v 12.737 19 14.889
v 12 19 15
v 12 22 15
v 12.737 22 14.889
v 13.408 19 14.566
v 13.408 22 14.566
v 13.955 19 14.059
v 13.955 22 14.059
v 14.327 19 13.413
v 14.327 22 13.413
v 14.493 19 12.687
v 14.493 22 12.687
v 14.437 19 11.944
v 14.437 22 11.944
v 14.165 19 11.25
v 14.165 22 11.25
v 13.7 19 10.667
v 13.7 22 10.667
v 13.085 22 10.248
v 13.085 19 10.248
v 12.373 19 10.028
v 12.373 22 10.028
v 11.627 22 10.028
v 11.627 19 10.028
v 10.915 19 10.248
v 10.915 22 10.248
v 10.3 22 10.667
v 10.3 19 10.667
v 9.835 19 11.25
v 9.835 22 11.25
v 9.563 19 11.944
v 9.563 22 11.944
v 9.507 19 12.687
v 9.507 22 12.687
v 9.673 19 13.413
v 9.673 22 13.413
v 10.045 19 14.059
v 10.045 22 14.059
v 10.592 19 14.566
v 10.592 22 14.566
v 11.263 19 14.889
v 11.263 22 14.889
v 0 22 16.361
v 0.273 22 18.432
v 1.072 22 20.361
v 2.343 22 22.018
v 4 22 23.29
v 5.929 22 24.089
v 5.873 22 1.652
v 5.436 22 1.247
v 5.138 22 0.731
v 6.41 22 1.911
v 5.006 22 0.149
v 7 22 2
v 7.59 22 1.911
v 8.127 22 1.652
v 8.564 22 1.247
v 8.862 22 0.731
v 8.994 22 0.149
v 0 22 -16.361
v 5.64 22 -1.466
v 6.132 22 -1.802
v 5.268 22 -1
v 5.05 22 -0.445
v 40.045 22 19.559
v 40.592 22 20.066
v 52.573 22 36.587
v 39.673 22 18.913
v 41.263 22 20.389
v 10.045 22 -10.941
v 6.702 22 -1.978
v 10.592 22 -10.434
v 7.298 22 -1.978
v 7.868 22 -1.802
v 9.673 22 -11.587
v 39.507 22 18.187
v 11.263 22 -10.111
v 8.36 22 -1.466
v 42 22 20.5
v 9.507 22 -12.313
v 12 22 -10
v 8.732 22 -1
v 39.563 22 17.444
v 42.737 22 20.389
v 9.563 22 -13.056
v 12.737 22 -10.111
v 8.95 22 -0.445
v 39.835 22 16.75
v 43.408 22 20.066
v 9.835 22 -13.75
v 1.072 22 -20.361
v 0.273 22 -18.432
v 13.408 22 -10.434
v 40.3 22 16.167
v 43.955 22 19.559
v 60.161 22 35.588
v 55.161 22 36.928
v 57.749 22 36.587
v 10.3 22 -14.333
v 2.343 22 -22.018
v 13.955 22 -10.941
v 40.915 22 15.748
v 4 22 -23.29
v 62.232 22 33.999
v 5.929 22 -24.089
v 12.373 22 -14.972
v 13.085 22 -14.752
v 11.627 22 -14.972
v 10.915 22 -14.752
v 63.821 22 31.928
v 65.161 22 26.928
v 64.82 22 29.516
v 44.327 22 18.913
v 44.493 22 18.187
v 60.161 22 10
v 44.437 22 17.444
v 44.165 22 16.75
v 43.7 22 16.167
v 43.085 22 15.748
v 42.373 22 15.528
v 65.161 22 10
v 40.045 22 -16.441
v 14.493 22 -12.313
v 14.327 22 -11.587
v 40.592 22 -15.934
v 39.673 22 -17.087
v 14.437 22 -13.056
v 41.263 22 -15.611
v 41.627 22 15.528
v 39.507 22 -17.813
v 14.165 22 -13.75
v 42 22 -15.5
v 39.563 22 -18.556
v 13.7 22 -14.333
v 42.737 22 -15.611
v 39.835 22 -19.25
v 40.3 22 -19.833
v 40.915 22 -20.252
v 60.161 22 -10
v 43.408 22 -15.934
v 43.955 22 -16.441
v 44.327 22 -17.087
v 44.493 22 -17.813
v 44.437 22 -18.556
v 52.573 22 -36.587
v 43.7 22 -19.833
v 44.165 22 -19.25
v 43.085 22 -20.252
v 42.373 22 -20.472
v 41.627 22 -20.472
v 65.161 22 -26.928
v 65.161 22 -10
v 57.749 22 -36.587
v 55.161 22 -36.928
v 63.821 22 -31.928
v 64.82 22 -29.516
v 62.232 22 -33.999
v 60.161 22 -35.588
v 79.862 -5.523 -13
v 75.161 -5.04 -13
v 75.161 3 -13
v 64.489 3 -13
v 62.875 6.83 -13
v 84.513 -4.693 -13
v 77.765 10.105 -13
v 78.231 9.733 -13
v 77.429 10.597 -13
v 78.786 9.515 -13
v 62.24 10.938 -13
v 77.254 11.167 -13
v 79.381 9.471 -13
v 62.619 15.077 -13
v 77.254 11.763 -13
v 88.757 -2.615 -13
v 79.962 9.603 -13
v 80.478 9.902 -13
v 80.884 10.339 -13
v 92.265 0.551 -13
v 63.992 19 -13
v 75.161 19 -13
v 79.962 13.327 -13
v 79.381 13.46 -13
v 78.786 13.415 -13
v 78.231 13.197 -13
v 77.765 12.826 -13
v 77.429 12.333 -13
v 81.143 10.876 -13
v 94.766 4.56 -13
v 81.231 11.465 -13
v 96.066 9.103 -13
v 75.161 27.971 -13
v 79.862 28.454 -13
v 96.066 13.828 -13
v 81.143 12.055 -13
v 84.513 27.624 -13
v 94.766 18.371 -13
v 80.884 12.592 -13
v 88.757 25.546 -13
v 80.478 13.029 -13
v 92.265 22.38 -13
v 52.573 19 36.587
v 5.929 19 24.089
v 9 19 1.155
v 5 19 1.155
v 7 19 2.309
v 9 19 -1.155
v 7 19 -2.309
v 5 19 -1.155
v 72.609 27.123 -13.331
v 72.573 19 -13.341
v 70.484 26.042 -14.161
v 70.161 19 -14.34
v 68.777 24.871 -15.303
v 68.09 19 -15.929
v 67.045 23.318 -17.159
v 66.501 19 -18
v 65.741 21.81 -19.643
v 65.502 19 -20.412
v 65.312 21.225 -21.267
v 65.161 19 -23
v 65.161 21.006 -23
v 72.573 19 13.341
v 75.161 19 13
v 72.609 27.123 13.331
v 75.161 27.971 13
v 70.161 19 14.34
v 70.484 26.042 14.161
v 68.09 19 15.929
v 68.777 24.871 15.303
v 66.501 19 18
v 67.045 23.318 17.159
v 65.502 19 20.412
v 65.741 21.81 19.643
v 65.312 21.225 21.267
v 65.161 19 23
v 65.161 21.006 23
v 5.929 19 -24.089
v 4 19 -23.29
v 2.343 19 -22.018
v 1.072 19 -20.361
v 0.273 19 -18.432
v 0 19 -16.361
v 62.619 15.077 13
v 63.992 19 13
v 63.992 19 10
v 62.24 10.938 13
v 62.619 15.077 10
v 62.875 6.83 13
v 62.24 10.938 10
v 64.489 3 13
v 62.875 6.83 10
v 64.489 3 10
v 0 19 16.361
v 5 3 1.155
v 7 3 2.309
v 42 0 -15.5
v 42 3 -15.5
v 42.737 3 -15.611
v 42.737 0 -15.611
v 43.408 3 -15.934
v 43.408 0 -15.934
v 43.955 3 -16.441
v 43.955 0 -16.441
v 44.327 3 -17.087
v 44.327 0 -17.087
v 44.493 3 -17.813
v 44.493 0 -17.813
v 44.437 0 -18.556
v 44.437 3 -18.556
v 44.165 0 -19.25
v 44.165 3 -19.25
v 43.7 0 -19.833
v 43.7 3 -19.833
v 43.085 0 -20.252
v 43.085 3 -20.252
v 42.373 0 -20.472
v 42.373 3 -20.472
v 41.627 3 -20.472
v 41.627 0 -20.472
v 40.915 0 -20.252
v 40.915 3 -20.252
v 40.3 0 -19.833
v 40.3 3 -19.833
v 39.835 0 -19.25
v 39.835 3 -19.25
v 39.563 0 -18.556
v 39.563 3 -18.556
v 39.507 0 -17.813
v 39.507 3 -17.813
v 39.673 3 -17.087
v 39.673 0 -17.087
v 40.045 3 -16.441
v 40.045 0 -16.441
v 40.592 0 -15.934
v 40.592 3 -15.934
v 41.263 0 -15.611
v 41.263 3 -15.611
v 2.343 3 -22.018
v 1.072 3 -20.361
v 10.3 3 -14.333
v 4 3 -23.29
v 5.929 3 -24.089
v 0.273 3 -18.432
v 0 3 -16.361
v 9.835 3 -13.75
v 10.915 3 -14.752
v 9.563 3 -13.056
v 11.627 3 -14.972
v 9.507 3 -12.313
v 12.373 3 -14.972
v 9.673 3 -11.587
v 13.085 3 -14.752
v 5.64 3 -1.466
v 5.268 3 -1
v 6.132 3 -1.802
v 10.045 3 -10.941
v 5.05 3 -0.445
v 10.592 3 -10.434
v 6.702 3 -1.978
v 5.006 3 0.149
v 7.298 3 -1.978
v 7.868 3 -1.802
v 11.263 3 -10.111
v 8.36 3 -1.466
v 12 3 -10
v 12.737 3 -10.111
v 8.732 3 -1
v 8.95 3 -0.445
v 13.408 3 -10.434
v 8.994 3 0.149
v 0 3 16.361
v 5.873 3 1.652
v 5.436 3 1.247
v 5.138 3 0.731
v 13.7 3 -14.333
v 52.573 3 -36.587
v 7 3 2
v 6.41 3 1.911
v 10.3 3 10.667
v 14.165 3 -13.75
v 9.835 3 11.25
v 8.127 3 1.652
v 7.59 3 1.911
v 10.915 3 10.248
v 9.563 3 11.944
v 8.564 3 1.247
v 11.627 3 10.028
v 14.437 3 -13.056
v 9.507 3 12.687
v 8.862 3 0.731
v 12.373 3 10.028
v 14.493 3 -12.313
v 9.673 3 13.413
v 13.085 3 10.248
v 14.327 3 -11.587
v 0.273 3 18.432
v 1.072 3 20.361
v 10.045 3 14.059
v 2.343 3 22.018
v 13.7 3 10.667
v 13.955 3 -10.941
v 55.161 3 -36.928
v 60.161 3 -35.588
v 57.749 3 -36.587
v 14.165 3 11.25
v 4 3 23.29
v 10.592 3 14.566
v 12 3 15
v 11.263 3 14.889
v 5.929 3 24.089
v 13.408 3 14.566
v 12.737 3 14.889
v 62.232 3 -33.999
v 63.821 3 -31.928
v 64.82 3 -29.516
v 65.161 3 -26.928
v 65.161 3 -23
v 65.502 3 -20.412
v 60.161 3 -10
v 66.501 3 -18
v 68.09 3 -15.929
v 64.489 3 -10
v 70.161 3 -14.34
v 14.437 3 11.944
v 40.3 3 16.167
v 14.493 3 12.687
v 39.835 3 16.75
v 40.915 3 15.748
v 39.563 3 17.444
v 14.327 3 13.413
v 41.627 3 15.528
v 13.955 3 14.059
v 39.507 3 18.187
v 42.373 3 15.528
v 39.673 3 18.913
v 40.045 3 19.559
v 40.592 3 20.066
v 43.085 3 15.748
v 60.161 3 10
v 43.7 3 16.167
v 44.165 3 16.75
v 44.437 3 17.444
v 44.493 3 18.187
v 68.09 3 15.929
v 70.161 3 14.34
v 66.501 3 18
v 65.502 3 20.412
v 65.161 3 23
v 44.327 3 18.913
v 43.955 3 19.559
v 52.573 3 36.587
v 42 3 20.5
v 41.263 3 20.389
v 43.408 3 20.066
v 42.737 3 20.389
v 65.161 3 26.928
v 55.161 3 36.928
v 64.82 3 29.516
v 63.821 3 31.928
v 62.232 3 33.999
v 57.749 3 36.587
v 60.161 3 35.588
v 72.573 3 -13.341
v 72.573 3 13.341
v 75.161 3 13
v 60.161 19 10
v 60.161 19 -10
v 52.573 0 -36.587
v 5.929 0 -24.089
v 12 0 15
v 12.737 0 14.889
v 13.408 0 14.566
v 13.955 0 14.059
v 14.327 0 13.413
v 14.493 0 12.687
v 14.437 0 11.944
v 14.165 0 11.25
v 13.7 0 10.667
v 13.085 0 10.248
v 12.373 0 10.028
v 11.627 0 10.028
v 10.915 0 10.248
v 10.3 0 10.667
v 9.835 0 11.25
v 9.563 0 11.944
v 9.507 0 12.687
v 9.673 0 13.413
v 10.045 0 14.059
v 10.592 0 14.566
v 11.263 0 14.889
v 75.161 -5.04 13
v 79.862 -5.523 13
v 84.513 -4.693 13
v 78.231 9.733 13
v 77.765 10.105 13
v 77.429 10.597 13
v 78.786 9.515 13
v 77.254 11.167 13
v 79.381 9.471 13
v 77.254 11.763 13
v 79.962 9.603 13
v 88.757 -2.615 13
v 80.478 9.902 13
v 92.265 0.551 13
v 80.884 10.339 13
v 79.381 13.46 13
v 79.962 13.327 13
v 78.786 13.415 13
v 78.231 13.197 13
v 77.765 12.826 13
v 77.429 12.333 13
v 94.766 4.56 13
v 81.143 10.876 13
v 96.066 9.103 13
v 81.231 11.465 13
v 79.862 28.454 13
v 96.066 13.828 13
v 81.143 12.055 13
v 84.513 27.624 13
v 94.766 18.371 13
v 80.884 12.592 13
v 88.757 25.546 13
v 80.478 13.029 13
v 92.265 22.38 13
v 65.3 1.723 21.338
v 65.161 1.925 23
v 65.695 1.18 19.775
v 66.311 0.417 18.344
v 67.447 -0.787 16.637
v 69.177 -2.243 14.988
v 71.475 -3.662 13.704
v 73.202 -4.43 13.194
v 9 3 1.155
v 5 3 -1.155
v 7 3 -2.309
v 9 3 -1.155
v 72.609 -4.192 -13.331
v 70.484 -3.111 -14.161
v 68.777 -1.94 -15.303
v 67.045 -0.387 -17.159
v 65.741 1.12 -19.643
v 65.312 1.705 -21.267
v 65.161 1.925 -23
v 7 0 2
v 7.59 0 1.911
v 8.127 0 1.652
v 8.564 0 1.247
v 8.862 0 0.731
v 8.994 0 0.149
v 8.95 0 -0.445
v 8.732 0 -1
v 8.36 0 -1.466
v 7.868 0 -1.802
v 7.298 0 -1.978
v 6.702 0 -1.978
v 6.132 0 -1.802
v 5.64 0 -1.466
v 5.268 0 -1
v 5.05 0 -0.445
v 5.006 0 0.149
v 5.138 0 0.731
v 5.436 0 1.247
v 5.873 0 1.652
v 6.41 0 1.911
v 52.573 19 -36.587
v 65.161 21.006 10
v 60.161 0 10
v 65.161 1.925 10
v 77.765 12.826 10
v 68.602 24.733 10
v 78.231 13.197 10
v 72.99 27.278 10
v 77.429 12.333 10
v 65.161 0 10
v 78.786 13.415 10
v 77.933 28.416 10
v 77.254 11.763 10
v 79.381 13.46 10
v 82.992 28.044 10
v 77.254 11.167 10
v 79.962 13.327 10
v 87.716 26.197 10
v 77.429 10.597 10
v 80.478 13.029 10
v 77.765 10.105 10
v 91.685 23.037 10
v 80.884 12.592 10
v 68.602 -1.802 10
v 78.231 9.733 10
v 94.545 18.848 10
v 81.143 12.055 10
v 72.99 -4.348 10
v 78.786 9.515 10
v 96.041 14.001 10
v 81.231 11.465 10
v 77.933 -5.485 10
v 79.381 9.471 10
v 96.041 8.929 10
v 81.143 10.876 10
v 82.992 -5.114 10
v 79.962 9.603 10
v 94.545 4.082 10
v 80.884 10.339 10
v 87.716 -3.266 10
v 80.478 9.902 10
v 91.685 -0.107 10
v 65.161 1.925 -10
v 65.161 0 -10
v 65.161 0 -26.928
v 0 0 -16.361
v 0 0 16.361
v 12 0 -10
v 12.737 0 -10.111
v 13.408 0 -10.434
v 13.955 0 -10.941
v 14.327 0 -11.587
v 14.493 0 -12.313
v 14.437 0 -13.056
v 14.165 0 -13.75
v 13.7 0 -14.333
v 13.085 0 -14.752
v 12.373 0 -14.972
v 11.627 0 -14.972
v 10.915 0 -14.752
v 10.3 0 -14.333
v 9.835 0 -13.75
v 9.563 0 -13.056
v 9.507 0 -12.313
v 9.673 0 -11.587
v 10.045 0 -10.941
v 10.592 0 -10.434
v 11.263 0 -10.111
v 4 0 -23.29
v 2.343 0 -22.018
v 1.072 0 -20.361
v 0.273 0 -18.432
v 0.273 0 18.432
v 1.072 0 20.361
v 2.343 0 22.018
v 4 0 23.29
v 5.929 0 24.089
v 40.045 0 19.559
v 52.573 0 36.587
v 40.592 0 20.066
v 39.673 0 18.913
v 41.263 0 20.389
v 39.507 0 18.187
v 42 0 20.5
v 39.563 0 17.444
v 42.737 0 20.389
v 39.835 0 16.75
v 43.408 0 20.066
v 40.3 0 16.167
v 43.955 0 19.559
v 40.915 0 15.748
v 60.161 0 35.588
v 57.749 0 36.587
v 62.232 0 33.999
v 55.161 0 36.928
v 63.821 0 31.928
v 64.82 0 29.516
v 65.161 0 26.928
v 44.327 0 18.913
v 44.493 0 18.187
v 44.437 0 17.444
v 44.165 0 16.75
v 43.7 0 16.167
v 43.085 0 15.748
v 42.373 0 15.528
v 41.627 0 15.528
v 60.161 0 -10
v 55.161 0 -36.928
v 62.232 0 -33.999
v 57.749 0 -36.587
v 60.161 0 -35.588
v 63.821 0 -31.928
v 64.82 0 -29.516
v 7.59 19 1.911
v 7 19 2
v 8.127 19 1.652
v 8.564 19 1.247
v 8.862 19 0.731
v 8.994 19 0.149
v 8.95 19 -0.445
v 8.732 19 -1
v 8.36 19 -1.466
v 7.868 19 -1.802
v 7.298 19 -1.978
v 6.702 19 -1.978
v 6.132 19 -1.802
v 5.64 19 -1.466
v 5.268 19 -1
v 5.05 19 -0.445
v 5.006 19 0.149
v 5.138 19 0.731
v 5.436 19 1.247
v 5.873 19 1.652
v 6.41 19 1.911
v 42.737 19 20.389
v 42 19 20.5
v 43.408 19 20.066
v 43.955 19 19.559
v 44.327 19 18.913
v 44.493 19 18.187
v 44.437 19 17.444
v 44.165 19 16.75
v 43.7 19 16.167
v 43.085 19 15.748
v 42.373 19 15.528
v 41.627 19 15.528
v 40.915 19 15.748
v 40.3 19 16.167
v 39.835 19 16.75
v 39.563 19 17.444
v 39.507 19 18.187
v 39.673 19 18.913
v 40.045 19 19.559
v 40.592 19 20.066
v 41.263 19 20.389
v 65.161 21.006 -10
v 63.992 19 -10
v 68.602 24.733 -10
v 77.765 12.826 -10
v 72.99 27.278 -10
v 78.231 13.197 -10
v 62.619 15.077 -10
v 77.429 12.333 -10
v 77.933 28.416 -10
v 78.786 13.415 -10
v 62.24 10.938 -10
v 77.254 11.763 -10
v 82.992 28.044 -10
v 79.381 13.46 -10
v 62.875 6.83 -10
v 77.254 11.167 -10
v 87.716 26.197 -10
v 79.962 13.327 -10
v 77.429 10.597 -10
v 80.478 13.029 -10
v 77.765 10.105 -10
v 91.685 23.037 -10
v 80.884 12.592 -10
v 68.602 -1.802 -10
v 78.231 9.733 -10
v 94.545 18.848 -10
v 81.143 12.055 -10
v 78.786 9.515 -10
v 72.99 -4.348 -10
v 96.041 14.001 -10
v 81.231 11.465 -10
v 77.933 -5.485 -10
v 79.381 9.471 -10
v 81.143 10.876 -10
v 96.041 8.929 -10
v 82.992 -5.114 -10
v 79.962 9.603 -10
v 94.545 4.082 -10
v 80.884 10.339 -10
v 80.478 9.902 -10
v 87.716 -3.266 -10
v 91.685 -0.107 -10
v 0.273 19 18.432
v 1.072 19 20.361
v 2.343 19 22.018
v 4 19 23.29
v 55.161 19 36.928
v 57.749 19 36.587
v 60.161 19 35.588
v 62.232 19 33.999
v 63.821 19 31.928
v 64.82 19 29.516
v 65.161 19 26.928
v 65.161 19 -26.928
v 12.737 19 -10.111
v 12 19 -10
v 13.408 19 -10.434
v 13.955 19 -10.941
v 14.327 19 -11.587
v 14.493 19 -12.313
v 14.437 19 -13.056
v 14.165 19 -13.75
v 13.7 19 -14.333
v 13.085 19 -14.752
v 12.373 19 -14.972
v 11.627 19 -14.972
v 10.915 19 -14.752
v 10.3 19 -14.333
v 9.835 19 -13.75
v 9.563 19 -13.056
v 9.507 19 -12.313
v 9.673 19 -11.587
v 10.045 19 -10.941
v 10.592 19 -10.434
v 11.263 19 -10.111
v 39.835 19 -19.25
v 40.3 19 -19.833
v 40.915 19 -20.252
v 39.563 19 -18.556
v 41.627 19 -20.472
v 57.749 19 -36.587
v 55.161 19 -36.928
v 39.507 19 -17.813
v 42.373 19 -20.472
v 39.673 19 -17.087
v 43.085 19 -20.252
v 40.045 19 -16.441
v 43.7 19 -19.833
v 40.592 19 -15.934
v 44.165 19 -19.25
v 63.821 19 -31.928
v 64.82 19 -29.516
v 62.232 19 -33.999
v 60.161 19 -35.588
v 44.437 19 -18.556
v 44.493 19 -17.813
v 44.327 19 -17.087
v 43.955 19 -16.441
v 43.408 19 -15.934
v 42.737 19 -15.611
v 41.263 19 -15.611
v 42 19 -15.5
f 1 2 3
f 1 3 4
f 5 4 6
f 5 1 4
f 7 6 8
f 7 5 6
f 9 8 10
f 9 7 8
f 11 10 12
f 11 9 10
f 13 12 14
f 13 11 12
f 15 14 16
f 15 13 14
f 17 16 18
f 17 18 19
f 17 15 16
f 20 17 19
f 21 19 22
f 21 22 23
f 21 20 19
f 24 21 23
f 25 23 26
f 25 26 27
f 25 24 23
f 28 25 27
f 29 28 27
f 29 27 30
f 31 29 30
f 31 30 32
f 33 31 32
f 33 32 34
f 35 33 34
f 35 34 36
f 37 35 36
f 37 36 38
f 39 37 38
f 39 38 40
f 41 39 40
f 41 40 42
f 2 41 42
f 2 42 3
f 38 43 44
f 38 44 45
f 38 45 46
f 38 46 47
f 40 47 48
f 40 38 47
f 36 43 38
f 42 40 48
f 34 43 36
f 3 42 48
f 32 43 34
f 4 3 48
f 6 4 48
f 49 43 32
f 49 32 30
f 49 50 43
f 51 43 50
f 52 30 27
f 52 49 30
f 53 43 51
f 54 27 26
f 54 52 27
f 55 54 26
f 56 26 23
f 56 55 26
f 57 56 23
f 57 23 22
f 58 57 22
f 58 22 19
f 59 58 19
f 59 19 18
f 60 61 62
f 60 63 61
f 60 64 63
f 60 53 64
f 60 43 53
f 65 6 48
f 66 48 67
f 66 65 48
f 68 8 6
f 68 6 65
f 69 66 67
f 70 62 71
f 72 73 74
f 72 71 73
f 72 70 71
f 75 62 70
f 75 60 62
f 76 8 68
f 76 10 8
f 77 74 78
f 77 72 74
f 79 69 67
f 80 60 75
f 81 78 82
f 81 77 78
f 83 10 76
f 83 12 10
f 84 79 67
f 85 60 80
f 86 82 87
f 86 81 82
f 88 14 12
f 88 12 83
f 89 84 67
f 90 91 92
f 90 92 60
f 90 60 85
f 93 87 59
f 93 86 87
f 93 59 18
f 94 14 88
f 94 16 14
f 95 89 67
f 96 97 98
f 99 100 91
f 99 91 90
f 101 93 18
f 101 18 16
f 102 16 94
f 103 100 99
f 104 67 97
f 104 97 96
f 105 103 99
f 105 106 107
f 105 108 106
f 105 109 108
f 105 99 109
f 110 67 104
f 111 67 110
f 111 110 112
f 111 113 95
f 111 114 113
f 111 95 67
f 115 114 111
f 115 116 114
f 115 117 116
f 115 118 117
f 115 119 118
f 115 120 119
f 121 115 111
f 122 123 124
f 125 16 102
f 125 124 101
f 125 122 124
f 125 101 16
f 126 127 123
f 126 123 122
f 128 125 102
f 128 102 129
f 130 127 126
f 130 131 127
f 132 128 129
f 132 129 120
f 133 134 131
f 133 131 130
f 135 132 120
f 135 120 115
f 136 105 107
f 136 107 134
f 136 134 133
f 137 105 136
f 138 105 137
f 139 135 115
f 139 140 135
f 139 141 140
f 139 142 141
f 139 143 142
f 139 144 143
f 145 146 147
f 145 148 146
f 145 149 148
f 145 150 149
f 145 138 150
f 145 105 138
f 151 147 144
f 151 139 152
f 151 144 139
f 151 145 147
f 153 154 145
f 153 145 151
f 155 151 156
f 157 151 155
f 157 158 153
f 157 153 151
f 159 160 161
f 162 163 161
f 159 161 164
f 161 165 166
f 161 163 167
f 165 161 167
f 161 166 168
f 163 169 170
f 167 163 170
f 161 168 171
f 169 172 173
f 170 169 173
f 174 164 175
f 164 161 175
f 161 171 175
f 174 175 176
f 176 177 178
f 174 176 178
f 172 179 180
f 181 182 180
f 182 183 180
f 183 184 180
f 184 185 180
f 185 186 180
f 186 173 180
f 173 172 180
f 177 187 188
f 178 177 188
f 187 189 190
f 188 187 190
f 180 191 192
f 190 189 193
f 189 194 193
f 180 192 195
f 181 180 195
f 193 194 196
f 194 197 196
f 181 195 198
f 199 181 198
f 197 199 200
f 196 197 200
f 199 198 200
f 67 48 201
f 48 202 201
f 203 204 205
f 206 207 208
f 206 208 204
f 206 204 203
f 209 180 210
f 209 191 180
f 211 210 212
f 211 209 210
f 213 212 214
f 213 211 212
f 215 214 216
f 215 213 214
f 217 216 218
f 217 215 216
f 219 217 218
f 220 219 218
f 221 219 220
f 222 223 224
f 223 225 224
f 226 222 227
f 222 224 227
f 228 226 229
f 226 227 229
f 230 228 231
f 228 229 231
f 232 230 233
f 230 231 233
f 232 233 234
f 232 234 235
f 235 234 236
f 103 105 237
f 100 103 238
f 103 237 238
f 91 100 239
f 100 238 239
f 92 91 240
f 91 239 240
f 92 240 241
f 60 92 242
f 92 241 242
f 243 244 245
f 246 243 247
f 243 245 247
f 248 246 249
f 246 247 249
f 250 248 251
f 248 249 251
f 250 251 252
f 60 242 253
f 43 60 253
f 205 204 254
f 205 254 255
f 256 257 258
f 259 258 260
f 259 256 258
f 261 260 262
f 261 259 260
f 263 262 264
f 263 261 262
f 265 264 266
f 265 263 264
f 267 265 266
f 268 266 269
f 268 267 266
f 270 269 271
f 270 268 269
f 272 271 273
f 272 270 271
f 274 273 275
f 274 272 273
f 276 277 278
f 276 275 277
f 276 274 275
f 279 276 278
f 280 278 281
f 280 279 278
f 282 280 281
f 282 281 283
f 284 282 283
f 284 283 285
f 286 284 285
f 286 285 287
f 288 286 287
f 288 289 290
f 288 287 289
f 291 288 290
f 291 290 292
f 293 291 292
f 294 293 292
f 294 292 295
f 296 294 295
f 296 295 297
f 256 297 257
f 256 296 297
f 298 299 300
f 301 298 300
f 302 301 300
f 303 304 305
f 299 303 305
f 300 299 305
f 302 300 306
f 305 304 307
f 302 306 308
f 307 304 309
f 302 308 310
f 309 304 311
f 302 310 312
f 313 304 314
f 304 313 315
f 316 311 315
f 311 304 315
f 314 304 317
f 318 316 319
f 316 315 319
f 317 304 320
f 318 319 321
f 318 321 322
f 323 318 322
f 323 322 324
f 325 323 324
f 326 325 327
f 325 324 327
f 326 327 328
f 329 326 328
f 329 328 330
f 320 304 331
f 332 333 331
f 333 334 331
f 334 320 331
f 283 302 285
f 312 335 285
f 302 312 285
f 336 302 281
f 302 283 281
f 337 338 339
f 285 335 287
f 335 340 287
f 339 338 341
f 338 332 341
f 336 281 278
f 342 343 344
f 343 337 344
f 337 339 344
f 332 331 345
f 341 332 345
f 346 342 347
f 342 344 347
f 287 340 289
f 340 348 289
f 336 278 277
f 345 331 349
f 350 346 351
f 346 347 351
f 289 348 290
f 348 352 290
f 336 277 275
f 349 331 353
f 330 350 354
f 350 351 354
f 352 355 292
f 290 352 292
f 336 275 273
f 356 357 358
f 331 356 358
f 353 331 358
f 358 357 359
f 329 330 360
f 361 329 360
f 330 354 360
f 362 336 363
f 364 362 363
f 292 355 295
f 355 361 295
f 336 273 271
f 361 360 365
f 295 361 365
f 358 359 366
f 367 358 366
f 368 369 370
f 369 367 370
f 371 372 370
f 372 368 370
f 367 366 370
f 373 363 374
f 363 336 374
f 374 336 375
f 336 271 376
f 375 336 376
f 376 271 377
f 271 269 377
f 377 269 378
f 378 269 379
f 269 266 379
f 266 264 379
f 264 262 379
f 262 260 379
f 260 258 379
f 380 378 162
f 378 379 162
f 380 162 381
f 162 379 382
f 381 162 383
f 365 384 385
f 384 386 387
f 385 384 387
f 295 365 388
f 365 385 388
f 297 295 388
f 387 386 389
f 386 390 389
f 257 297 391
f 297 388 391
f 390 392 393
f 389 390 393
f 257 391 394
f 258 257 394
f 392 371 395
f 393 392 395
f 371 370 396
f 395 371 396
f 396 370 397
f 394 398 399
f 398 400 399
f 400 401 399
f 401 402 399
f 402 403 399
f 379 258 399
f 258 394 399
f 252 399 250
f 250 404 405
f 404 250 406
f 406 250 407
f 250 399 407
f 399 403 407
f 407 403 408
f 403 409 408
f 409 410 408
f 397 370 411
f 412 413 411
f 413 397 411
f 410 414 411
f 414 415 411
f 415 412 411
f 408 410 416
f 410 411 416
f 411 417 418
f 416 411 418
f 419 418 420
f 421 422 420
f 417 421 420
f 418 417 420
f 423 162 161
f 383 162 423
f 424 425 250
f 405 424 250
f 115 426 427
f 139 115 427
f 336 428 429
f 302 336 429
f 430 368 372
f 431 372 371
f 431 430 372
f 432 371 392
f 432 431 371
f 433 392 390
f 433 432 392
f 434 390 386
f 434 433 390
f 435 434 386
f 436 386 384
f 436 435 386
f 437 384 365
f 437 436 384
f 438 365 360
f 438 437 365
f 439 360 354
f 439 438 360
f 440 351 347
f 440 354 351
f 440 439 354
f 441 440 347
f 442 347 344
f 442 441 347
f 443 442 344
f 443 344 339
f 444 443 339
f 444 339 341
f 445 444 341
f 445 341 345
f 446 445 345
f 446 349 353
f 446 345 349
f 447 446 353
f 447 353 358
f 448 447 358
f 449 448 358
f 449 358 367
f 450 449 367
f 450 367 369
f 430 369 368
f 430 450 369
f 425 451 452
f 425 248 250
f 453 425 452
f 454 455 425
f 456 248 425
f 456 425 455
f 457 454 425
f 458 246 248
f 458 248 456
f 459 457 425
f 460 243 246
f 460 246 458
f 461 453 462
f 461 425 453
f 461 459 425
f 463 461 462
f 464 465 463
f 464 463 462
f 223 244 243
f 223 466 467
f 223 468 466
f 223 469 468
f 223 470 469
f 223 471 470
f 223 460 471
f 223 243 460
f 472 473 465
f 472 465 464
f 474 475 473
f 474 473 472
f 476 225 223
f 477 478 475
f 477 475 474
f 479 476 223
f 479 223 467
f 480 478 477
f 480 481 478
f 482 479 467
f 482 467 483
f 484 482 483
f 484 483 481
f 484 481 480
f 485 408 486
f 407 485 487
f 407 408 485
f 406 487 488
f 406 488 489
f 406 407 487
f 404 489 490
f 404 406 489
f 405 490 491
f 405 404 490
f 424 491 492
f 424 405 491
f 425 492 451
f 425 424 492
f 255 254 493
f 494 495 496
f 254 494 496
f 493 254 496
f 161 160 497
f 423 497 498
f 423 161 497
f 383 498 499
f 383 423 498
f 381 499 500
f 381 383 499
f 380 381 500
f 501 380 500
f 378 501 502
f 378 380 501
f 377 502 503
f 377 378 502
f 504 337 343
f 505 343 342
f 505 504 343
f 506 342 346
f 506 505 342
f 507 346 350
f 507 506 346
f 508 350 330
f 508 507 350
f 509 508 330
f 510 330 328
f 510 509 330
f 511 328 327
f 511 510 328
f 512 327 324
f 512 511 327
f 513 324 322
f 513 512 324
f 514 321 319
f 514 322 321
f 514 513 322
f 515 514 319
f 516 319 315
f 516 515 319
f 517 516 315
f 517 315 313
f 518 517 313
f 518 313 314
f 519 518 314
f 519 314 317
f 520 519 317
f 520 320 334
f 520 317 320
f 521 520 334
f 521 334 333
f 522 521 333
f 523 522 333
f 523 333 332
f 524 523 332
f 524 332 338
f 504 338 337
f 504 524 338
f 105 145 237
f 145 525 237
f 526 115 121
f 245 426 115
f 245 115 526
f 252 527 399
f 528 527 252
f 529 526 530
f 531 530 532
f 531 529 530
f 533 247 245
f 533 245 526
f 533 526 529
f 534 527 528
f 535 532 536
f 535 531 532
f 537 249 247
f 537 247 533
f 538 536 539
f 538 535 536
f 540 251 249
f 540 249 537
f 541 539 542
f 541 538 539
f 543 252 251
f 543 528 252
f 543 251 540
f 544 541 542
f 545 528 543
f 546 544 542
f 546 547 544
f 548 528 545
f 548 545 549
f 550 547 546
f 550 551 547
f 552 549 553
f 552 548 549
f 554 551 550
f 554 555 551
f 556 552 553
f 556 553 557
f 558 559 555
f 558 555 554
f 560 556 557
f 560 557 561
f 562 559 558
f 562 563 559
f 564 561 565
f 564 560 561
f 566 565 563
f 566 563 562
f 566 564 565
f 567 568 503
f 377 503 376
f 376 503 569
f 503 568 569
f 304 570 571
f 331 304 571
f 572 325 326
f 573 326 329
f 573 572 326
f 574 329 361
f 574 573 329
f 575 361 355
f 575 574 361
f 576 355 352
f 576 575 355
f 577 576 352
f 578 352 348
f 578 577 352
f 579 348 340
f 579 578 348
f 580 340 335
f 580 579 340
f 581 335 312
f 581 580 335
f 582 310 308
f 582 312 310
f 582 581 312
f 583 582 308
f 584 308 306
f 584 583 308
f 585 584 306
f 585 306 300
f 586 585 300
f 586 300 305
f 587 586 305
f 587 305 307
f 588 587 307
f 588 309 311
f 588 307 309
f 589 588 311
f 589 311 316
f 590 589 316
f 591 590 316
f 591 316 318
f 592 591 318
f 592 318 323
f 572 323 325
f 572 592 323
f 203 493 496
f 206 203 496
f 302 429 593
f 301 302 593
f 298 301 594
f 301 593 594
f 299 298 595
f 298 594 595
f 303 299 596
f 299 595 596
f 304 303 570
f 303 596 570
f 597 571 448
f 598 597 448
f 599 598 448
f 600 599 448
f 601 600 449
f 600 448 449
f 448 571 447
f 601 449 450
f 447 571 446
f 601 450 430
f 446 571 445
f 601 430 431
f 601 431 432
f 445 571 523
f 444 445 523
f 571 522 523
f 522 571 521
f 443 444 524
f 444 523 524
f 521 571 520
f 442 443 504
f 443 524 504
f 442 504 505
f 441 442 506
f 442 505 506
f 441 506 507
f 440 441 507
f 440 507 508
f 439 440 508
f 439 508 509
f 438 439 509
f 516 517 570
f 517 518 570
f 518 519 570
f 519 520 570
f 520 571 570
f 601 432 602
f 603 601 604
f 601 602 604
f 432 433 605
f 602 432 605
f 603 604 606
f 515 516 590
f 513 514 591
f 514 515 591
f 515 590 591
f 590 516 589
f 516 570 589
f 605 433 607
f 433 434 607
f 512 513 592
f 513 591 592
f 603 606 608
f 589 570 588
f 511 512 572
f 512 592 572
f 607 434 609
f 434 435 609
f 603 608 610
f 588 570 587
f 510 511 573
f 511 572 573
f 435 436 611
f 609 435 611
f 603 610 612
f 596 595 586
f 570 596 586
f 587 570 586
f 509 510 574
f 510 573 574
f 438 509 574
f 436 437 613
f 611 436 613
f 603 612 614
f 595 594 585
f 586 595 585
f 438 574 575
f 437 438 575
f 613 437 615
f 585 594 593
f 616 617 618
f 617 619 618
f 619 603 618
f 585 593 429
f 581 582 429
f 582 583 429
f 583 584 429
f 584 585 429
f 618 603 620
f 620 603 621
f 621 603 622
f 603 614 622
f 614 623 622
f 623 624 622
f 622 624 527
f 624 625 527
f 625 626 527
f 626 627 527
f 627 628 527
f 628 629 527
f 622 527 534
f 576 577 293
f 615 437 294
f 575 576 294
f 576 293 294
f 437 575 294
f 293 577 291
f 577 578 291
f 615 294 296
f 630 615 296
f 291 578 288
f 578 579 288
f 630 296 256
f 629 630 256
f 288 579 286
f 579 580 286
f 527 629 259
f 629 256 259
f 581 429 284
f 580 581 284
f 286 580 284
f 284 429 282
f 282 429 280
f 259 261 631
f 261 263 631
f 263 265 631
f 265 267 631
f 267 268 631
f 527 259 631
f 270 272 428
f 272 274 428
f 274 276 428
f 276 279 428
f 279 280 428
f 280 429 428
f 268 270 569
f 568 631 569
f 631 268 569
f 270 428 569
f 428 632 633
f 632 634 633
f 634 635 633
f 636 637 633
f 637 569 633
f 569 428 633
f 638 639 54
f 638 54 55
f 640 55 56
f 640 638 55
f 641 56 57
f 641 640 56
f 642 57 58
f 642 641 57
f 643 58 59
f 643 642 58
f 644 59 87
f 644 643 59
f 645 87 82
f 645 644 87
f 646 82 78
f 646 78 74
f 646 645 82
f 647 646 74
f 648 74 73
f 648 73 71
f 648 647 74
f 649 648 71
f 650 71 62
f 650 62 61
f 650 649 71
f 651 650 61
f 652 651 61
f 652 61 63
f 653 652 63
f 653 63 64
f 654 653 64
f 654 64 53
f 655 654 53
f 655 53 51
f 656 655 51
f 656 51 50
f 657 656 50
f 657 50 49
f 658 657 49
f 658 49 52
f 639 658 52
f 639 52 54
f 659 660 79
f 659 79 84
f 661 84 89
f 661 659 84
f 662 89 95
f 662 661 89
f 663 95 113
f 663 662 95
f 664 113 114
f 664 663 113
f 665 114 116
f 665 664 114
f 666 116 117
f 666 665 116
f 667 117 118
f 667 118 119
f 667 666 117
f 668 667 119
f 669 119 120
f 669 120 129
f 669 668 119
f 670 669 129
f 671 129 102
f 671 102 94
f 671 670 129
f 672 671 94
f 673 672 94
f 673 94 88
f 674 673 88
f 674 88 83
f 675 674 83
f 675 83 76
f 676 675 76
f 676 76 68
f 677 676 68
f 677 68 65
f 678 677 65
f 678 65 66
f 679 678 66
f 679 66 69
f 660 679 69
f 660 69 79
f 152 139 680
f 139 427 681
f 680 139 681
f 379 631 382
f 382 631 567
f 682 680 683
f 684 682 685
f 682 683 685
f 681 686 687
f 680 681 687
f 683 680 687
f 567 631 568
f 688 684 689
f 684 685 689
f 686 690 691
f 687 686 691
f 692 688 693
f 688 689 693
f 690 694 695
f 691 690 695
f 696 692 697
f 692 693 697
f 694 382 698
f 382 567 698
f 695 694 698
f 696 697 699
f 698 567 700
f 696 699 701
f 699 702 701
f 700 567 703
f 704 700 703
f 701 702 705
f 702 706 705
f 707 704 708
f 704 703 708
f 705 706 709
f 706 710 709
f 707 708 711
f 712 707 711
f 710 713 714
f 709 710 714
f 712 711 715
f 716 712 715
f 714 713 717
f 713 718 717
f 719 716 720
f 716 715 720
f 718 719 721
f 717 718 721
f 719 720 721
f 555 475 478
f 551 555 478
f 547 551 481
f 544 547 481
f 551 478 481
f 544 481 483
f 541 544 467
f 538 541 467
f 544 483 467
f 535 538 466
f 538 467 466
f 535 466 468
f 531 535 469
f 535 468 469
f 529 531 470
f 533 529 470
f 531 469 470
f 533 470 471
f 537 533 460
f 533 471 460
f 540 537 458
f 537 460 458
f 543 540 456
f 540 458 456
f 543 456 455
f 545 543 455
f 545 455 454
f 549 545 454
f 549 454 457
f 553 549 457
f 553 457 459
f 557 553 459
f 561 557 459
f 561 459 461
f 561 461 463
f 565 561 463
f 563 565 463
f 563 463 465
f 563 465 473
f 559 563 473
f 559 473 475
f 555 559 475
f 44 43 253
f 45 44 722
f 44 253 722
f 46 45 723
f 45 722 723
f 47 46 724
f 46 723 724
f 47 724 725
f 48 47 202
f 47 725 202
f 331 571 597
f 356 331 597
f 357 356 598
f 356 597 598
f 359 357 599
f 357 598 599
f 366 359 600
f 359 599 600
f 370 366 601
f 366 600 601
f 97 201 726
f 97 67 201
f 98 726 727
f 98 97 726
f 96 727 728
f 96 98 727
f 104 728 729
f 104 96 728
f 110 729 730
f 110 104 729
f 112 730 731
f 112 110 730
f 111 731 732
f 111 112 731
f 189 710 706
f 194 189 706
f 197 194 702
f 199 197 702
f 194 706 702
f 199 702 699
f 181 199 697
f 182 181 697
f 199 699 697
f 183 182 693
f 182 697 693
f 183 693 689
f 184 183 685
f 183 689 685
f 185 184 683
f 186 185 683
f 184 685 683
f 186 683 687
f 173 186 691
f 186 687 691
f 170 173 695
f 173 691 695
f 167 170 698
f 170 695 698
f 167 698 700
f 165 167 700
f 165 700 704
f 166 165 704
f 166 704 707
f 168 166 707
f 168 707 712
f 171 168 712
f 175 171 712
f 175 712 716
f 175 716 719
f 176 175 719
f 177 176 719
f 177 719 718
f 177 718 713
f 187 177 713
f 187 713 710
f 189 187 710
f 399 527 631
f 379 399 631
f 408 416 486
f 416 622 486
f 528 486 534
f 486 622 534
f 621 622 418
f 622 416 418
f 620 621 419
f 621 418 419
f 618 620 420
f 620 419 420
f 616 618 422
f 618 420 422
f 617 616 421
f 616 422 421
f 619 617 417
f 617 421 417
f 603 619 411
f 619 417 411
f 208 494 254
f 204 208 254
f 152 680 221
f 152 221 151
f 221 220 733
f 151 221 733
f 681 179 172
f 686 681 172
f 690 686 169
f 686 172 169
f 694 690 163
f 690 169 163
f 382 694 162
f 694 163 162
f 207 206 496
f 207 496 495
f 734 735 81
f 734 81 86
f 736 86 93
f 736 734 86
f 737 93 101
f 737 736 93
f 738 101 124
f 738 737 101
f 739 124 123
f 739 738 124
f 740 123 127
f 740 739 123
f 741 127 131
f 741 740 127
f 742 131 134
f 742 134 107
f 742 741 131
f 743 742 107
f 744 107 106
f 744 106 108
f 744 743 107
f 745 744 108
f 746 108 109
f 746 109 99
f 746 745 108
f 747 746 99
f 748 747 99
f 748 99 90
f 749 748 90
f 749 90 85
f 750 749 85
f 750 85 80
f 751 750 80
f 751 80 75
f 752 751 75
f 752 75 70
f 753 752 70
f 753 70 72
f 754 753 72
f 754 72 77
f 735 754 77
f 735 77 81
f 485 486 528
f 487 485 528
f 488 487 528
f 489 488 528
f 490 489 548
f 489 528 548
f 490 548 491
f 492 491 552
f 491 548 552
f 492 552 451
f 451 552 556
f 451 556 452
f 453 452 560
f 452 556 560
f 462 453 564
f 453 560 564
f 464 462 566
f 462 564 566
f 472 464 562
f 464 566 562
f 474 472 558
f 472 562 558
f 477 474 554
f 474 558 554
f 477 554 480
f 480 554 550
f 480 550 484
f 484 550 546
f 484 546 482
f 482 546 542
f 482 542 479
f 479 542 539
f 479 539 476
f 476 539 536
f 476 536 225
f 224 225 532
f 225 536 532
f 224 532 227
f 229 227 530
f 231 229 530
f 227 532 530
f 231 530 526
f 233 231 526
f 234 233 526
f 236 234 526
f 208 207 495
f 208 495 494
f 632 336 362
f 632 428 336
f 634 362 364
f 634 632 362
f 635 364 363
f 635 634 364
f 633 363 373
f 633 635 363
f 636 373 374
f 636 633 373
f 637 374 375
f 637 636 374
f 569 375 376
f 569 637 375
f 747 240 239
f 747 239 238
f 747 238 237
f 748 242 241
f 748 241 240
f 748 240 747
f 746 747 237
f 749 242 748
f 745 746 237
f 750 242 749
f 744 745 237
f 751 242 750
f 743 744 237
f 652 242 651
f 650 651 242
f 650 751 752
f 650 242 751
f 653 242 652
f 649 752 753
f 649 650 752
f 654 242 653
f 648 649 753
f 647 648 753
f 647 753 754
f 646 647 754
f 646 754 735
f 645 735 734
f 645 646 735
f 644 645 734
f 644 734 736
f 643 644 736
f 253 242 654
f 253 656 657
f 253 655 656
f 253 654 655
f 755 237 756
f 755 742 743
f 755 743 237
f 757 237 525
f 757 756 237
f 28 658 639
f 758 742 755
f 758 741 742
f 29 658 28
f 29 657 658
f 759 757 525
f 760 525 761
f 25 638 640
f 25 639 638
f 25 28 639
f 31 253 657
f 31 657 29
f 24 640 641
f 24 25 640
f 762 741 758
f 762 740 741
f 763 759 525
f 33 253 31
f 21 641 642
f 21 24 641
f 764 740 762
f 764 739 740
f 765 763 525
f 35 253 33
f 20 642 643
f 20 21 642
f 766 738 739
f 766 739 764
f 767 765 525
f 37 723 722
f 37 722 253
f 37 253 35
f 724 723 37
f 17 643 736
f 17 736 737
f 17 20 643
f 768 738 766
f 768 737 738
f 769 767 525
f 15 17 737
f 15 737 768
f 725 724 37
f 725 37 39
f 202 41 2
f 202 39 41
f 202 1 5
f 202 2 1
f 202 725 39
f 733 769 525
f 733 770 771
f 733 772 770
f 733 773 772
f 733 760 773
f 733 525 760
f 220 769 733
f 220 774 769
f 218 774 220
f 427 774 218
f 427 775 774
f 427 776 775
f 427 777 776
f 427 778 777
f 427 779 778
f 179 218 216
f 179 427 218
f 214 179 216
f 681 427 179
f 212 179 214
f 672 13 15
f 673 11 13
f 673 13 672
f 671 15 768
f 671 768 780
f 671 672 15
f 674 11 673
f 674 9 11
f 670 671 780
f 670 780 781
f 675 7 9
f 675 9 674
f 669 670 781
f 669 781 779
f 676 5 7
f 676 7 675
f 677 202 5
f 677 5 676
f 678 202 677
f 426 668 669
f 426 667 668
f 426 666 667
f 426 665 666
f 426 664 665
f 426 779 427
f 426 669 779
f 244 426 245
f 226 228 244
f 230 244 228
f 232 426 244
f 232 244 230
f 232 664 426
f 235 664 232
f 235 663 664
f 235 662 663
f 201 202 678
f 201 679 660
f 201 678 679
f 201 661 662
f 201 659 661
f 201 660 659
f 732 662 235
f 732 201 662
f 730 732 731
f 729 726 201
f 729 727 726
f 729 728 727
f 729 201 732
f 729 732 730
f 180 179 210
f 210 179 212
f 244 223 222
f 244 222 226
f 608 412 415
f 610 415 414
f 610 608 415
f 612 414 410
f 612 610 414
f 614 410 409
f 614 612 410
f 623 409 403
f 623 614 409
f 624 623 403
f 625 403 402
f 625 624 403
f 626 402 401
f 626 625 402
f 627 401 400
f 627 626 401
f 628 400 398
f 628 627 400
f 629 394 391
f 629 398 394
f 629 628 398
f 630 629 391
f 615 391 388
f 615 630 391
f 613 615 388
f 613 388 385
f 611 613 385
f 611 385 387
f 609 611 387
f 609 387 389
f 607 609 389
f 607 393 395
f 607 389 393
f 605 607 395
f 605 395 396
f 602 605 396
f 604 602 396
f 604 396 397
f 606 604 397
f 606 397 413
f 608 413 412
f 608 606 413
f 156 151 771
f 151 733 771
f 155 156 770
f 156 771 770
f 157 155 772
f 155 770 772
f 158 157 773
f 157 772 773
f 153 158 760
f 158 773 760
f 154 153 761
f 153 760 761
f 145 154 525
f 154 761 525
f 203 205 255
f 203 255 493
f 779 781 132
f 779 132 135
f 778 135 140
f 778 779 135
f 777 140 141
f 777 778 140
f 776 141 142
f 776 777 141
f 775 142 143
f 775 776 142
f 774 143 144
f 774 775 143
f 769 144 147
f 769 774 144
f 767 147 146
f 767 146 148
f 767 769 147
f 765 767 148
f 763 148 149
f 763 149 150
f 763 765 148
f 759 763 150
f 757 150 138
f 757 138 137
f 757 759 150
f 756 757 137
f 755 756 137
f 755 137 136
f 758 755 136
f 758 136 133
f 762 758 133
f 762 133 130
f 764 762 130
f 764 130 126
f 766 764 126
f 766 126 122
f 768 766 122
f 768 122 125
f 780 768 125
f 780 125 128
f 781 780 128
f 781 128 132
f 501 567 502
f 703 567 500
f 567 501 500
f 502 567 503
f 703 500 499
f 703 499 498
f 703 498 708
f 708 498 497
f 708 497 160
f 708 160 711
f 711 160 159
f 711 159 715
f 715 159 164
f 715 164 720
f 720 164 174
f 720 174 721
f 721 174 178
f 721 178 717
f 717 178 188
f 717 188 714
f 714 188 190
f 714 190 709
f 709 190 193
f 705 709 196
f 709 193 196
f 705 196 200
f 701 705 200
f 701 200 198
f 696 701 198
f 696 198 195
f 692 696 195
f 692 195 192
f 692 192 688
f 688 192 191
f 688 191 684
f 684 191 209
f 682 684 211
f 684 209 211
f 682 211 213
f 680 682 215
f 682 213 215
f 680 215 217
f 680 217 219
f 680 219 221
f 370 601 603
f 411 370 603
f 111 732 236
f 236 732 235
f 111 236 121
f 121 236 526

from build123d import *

# Parameters (mm, degrees)
CROQUIS1_R                = 2.5
CROQUIS1_R_2              = 2
SALIENTE_EXTRUIR1_DEPTH   = 22
CROQUIS2_W                = 80
CROQUIS2_H                = 16
CORTAR_EXTRUIR1_DEPTH     = 50
SALIENTE_EXTRUIR2_DEPTH   = 16
SALIENTE_EXTRUIR2_2_DEPTH = 16
SALIENTE_EXTRUIR2_3_DEPTH = 16
SKETCH2_W                 = 24.073282634
SKETCH2_H                 = 99.797965629
CUT_EXTRUDE3_DEPTH        = 31
FILLET2_R                 = 10
FILLET3_R                 = 10
BOSS_EXTRUDE1_DEPTH       = 13
BOSS_EXTRUDE1_DEPTH_BACK  = 13
SKETCH3_R                 = 17
CUT_EXTRUDE4_DEPTH        = 51
CUT_EXTRUDE4_DEPTH_BACK   = 51
SKETCH4_W                 = 61.979408986
SKETCH4_H                 = 20
SKETCH5_R                 = 2
CUT_EXTRUDE5_DEPTH        = 51
FILLET4_R                 = 10


with BuildPart() as part:
    # Croquis1 → Saliente-Extruir1 (new body)
    with BuildSketch(Plane(origin=(0, 0, 0), x_dir=(1, 0, 0), z_dir=(0, 1, 0))):
        with BuildLine():
            Line((0, 16.361384096), (0, -16.361384096))
            ThreePointArc((0, -16.361384096), (1.653173278, -21.231475528), (5.929447639, -24.088790706))
            Line((5.929447639, -24.088790706), (69.929447639, -41.237539022))
            ThreePointArc((69.929447639, -41.237539022), (76.870091432, -39.856959134), (80, -33.510132412))
            Line((80, -33.510132412), (80, 33.510132412))
            ThreePointArc((80, 33.510132412), (76.870091432, 39.856959134), (69.929447639, 41.237539022))
            Line((69.929447639, 41.237539022), (5.929447639, 24.088790706))
            ThreePointArc((5.929447639, 24.088790706), (1.653173278, 21.231475528), (0, 16.361384096))
        make_face()
        with Locations((12, 12.5)):
            Circle(CROQUIS1_R, mode=Mode.SUBTRACT)
        with Locations((12, -12.5)):
            Circle(CROQUIS1_R, mode=Mode.SUBTRACT)
        with Locations((42, 18)):
            Circle(CROQUIS1_R, mode=Mode.SUBTRACT)
        with Locations((42, -18)):
            Circle(CROQUIS1_R, mode=Mode.SUBTRACT)
        with Locations((7, 0)):
            Circle(CROQUIS1_R_2, mode=Mode.SUBTRACT)
        with Locations((72, -30)):
            Circle(CROQUIS1_R_2, mode=Mode.SUBTRACT)
        with Locations((72, 30)):
            Circle(CROQUIS1_R_2, mode=Mode.SUBTRACT)
    extrude(amount=SALIENTE_EXTRUIR1_DEPTH)

    # Croquis2 → Cortar-Extruir1 (cut, symmetric)
    with BuildSketch(Plane.XY):
        with Locations((40, 11)):
            Rectangle(CROQUIS2_W, CROQUIS2_H)
    extrude(amount=CORTAR_EXTRUIR1_DEPTH, both=True, mode=Mode.SUBTRACT)


with BuildPart() as cortar_extruir1_piece_1:
    # of the separate pieces the step leaves, piece 1, a body of its own (cortar_extruir1_pieces)
    add(part.part.solids().sort_by_distance((69.929447639, 0, -41.237539022))[0])


with BuildPart() as cortar_extruir1_piece_2:
    # of the separate pieces the step leaves, piece 2, a body of its own (cortar_extruir1_pieces)
    add(part.part.solids().sort_by_distance((5.929447639, 19, -24.088790706))[0])


with BuildPart() as body_3:
    # Croquis3 → Saliente-Extruir2 (new body)
    with BuildSketch(Plane(origin=(0, 3, 0), x_dir=(1, 0, 0), z_dir=(0, 1, 0))):
        Polygon((7, -2.309401077), (9, -1.154700538), (9, 1.154700538), (7, 2.309401077), (5, 1.154700538), (5, -1.154700538), align=None)
    extrude(amount=SALIENTE_EXTRUIR2_DEPTH)


with BuildPart() as body_4:
    # Croquis3 → Saliente-Extruir2 2 (new body)
    with BuildSketch(Plane(origin=(0, 3, 0), x_dir=(1, 0, 0), z_dir=(0, 1, 0))):
        Polygon((70.845299462, -32), (73.154700538, -32), (74.309401077, -30), (73.154700538, -28), (70.845299462, -28), (69.690598923, -30), align=None)
    extrude(amount=SALIENTE_EXTRUIR2_2_DEPTH)


with BuildPart() as body_5:
    # Croquis3 → Saliente-Extruir2 3 (new body)
    with BuildSketch(Plane(origin=(0, 3, 0), x_dir=(1, 0, 0), z_dir=(0, 1, 0))):
        Polygon((74, 28.845299462), (74, 31.154700538), (72, 32.309401077), (70, 31.154700538), (70, 28.845299462), (72, 27.690598923), align=None)
    extrude(amount=SALIENTE_EXTRUIR2_3_DEPTH)


with BuildPart() as cut_extrude3_tool:
    # Sketch2 → Cut-Extrude3 (new body)
    with BuildSketch(Plane(origin=(0, 0, 0), x_dir=(1, 0, 0), z_dir=(0, 1, 0))):
        with Locations((77.197652104, 1.837365647)):
            Rectangle(SKETCH2_W, SKETCH2_H)
    extrude(amount=CUT_EXTRUDE3_DEPTH)


with BuildPart() as cortar_extruir1_piece_1_1:
    add(cortar_extruir1_piece_1.part)

    # Cut-Extrude3: cut by cut_extrude3_tool
    add(cut_extrude3_tool.part, mode=Mode.SUBTRACT)

    # Fillet3
    fillet3_edges = [cortar_extruir1_piece_1_1.edges().sort_by_distance(p)[0] for p in [
        (65.161010787, 1.5, 39.959840218),
        (65.161010787, 1.5, -39.959840218),
    ]]
    fillet(fillet3_edges, radius=FILLET3_R)



with BuildPart() as cortar_extruir1_piece_2_1:
    add(cortar_extruir1_piece_2.part)

    # Cut-Extrude3: cut by cut_extrude3_tool
    add(cut_extrude3_tool.part, mode=Mode.SUBTRACT)

    # Fillet2
    fillet2_edges = [cortar_extruir1_piece_2_1.edges().sort_by_distance(p)[0] for p in [
        (65.161010787, 20.5, -39.959840218),
        (65.161010787, 20.5, 39.959840218),
    ]]
    fillet(fillet2_edges, radius=FILLET2_R)


with BuildPart() as body_4_1:
    add(body_4.part)

    # Cut-Extrude3: cut by cut_extrude3_tool
    add(cut_extrude3_tool.part, mode=Mode.SUBTRACT)


with BuildPart() as body_5_1:
    add(body_5.part)

    # Cut-Extrude3: cut by cut_extrude3_tool
    add(cut_extrude3_tool.part, mode=Mode.SUBTRACT)


with BuildPart() as cortar_extruir1_piece_1_2:
    add(cortar_extruir1_piece_1_1.part)

    add(cortar_extruir1_piece_2_1.part)  # Boss-Extrude1 merges Cortar-Extruir1 piece 2
    # Sketch3 → Boss-Extrude1 (add, two sides: drawn at the far end of the back side and taken through both)
    with BuildSketch(Plane.XY.offset(-BOSS_EXTRUDE1_DEPTH_BACK)):
        with Locations((79.23136181, 11.465223166)):
            Circle(SKETCH3_R)
    extrude(amount=BOSS_EXTRUDE1_DEPTH + BOSS_EXTRUDE1_DEPTH_BACK)

    # Sketch4 → Cut-Extrude4 (cut, two sides: drawn at the far end of the back side and taken through both)
    with BuildSketch(Plane(origin=(0, 0, 0), x_dir=(1, 0, 0), z_dir=(0, 1, 0)).offset(-CUT_EXTRUDE4_DEPTH_BACK)):
        with Locations((91.15071528, 0)):
            Rectangle(SKETCH4_W, SKETCH4_H)
    extrude(amount=CUT_EXTRUDE4_DEPTH + CUT_EXTRUDE4_DEPTH_BACK, mode=Mode.SUBTRACT)

    # Sketch5 → Cut-Extrude5 (cut)
    with BuildSketch(Plane.XY.offset(13)):
        with Locations((79.23136181, 11.465223166)):
            Circle(SKETCH5_R)
    extrude(amount=-CUT_EXTRUDE5_DEPTH, mode=Mode.SUBTRACT)

    # Fillet4
    fillet4_edges = [cortar_extruir1_piece_1_2.edges().sort_by_distance(p)[0] for p in [
        (65.161010787, 20.002968543, 13),
        (65.161010787, 2.462254623, 13),
        (65.161010787, 20.002968543, -13),
        (65.161010787, 2.462254623, -13),
    ]]
    fillet(fillet4_edges, radius=FILLET4_R)


solid = Compound([body_3.part, cortar_extruir1_piece_1_2.part])
